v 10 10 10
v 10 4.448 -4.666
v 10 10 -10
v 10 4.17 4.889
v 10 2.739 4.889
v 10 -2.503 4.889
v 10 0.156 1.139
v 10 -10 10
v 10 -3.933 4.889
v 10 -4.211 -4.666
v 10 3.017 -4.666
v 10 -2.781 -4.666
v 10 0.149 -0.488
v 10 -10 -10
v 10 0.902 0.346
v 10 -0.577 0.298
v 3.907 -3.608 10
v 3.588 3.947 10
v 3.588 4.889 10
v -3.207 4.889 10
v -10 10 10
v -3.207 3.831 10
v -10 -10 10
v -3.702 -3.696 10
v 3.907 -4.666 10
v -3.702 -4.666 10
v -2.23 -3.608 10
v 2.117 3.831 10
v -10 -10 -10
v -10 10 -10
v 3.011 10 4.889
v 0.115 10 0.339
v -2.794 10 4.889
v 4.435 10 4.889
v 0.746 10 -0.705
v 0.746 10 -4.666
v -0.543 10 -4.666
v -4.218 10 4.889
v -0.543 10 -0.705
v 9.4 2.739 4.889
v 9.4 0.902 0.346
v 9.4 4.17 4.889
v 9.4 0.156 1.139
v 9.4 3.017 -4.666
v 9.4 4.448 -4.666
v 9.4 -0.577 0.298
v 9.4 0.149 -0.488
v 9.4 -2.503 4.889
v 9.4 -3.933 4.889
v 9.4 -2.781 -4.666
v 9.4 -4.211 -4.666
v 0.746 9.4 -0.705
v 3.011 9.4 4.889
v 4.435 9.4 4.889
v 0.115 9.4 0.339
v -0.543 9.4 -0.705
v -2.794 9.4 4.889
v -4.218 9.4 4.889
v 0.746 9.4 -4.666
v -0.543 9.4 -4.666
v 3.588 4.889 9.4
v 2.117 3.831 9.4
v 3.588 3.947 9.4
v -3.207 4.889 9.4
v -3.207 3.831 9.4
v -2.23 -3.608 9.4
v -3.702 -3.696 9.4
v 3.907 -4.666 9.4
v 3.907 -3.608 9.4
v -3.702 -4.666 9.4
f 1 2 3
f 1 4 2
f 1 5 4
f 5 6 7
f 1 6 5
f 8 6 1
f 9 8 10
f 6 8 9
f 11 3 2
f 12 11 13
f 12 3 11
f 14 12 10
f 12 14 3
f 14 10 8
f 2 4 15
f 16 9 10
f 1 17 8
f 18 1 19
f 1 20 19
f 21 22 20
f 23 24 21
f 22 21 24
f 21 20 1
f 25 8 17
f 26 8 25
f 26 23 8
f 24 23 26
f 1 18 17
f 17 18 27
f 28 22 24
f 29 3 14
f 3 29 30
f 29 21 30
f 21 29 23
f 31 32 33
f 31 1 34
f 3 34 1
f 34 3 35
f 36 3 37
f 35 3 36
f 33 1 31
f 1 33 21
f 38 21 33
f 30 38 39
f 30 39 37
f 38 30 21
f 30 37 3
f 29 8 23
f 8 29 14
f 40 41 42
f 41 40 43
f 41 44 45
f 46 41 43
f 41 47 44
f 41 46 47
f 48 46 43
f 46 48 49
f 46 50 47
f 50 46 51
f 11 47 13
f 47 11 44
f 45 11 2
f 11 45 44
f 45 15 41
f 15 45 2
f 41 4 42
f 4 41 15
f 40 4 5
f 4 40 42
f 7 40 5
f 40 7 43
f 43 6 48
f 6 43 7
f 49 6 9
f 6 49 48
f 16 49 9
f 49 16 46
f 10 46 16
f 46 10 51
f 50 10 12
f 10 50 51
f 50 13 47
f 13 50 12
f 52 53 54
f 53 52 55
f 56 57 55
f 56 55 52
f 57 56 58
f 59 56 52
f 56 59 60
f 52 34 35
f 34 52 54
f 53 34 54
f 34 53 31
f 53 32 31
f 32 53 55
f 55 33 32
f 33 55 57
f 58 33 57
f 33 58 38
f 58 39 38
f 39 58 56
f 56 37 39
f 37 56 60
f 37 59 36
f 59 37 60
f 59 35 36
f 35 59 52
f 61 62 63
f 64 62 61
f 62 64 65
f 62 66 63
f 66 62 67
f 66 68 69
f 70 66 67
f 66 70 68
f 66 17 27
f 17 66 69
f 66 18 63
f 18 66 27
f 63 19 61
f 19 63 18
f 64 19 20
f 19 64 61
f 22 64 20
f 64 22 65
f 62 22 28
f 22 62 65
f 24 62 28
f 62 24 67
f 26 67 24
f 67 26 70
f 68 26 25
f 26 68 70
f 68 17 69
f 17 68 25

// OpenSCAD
// 20 mm calibration cube with embossed axis labels. Print to check dimensional accuracy.
size = 20;
label_depth = 0.6;

difference() {
    cube(size, center = true);
    // X label on +X face
    translate([size / 2 - label_depth, 0, 0]) rotate([90, 0, 90])
        linear_extrude(label_depth + 0.01) text("X", size = 10, halign = "center", valign = "center");
    // Y label on +Y face
    translate([0, size / 2 - label_depth, 0]) rotate([90, 0, 0]) mirror([0, 0, 1])
        linear_extrude(label_depth + 0.01) text("Y", size = 10, halign = "center", valign = "center");
    // Z label on top
    translate([0, 0, size / 2 - label_depth])
        linear_extrude(label_depth + 0.01) text("Z", size = 10, halign = "center", valign = "center");
}
